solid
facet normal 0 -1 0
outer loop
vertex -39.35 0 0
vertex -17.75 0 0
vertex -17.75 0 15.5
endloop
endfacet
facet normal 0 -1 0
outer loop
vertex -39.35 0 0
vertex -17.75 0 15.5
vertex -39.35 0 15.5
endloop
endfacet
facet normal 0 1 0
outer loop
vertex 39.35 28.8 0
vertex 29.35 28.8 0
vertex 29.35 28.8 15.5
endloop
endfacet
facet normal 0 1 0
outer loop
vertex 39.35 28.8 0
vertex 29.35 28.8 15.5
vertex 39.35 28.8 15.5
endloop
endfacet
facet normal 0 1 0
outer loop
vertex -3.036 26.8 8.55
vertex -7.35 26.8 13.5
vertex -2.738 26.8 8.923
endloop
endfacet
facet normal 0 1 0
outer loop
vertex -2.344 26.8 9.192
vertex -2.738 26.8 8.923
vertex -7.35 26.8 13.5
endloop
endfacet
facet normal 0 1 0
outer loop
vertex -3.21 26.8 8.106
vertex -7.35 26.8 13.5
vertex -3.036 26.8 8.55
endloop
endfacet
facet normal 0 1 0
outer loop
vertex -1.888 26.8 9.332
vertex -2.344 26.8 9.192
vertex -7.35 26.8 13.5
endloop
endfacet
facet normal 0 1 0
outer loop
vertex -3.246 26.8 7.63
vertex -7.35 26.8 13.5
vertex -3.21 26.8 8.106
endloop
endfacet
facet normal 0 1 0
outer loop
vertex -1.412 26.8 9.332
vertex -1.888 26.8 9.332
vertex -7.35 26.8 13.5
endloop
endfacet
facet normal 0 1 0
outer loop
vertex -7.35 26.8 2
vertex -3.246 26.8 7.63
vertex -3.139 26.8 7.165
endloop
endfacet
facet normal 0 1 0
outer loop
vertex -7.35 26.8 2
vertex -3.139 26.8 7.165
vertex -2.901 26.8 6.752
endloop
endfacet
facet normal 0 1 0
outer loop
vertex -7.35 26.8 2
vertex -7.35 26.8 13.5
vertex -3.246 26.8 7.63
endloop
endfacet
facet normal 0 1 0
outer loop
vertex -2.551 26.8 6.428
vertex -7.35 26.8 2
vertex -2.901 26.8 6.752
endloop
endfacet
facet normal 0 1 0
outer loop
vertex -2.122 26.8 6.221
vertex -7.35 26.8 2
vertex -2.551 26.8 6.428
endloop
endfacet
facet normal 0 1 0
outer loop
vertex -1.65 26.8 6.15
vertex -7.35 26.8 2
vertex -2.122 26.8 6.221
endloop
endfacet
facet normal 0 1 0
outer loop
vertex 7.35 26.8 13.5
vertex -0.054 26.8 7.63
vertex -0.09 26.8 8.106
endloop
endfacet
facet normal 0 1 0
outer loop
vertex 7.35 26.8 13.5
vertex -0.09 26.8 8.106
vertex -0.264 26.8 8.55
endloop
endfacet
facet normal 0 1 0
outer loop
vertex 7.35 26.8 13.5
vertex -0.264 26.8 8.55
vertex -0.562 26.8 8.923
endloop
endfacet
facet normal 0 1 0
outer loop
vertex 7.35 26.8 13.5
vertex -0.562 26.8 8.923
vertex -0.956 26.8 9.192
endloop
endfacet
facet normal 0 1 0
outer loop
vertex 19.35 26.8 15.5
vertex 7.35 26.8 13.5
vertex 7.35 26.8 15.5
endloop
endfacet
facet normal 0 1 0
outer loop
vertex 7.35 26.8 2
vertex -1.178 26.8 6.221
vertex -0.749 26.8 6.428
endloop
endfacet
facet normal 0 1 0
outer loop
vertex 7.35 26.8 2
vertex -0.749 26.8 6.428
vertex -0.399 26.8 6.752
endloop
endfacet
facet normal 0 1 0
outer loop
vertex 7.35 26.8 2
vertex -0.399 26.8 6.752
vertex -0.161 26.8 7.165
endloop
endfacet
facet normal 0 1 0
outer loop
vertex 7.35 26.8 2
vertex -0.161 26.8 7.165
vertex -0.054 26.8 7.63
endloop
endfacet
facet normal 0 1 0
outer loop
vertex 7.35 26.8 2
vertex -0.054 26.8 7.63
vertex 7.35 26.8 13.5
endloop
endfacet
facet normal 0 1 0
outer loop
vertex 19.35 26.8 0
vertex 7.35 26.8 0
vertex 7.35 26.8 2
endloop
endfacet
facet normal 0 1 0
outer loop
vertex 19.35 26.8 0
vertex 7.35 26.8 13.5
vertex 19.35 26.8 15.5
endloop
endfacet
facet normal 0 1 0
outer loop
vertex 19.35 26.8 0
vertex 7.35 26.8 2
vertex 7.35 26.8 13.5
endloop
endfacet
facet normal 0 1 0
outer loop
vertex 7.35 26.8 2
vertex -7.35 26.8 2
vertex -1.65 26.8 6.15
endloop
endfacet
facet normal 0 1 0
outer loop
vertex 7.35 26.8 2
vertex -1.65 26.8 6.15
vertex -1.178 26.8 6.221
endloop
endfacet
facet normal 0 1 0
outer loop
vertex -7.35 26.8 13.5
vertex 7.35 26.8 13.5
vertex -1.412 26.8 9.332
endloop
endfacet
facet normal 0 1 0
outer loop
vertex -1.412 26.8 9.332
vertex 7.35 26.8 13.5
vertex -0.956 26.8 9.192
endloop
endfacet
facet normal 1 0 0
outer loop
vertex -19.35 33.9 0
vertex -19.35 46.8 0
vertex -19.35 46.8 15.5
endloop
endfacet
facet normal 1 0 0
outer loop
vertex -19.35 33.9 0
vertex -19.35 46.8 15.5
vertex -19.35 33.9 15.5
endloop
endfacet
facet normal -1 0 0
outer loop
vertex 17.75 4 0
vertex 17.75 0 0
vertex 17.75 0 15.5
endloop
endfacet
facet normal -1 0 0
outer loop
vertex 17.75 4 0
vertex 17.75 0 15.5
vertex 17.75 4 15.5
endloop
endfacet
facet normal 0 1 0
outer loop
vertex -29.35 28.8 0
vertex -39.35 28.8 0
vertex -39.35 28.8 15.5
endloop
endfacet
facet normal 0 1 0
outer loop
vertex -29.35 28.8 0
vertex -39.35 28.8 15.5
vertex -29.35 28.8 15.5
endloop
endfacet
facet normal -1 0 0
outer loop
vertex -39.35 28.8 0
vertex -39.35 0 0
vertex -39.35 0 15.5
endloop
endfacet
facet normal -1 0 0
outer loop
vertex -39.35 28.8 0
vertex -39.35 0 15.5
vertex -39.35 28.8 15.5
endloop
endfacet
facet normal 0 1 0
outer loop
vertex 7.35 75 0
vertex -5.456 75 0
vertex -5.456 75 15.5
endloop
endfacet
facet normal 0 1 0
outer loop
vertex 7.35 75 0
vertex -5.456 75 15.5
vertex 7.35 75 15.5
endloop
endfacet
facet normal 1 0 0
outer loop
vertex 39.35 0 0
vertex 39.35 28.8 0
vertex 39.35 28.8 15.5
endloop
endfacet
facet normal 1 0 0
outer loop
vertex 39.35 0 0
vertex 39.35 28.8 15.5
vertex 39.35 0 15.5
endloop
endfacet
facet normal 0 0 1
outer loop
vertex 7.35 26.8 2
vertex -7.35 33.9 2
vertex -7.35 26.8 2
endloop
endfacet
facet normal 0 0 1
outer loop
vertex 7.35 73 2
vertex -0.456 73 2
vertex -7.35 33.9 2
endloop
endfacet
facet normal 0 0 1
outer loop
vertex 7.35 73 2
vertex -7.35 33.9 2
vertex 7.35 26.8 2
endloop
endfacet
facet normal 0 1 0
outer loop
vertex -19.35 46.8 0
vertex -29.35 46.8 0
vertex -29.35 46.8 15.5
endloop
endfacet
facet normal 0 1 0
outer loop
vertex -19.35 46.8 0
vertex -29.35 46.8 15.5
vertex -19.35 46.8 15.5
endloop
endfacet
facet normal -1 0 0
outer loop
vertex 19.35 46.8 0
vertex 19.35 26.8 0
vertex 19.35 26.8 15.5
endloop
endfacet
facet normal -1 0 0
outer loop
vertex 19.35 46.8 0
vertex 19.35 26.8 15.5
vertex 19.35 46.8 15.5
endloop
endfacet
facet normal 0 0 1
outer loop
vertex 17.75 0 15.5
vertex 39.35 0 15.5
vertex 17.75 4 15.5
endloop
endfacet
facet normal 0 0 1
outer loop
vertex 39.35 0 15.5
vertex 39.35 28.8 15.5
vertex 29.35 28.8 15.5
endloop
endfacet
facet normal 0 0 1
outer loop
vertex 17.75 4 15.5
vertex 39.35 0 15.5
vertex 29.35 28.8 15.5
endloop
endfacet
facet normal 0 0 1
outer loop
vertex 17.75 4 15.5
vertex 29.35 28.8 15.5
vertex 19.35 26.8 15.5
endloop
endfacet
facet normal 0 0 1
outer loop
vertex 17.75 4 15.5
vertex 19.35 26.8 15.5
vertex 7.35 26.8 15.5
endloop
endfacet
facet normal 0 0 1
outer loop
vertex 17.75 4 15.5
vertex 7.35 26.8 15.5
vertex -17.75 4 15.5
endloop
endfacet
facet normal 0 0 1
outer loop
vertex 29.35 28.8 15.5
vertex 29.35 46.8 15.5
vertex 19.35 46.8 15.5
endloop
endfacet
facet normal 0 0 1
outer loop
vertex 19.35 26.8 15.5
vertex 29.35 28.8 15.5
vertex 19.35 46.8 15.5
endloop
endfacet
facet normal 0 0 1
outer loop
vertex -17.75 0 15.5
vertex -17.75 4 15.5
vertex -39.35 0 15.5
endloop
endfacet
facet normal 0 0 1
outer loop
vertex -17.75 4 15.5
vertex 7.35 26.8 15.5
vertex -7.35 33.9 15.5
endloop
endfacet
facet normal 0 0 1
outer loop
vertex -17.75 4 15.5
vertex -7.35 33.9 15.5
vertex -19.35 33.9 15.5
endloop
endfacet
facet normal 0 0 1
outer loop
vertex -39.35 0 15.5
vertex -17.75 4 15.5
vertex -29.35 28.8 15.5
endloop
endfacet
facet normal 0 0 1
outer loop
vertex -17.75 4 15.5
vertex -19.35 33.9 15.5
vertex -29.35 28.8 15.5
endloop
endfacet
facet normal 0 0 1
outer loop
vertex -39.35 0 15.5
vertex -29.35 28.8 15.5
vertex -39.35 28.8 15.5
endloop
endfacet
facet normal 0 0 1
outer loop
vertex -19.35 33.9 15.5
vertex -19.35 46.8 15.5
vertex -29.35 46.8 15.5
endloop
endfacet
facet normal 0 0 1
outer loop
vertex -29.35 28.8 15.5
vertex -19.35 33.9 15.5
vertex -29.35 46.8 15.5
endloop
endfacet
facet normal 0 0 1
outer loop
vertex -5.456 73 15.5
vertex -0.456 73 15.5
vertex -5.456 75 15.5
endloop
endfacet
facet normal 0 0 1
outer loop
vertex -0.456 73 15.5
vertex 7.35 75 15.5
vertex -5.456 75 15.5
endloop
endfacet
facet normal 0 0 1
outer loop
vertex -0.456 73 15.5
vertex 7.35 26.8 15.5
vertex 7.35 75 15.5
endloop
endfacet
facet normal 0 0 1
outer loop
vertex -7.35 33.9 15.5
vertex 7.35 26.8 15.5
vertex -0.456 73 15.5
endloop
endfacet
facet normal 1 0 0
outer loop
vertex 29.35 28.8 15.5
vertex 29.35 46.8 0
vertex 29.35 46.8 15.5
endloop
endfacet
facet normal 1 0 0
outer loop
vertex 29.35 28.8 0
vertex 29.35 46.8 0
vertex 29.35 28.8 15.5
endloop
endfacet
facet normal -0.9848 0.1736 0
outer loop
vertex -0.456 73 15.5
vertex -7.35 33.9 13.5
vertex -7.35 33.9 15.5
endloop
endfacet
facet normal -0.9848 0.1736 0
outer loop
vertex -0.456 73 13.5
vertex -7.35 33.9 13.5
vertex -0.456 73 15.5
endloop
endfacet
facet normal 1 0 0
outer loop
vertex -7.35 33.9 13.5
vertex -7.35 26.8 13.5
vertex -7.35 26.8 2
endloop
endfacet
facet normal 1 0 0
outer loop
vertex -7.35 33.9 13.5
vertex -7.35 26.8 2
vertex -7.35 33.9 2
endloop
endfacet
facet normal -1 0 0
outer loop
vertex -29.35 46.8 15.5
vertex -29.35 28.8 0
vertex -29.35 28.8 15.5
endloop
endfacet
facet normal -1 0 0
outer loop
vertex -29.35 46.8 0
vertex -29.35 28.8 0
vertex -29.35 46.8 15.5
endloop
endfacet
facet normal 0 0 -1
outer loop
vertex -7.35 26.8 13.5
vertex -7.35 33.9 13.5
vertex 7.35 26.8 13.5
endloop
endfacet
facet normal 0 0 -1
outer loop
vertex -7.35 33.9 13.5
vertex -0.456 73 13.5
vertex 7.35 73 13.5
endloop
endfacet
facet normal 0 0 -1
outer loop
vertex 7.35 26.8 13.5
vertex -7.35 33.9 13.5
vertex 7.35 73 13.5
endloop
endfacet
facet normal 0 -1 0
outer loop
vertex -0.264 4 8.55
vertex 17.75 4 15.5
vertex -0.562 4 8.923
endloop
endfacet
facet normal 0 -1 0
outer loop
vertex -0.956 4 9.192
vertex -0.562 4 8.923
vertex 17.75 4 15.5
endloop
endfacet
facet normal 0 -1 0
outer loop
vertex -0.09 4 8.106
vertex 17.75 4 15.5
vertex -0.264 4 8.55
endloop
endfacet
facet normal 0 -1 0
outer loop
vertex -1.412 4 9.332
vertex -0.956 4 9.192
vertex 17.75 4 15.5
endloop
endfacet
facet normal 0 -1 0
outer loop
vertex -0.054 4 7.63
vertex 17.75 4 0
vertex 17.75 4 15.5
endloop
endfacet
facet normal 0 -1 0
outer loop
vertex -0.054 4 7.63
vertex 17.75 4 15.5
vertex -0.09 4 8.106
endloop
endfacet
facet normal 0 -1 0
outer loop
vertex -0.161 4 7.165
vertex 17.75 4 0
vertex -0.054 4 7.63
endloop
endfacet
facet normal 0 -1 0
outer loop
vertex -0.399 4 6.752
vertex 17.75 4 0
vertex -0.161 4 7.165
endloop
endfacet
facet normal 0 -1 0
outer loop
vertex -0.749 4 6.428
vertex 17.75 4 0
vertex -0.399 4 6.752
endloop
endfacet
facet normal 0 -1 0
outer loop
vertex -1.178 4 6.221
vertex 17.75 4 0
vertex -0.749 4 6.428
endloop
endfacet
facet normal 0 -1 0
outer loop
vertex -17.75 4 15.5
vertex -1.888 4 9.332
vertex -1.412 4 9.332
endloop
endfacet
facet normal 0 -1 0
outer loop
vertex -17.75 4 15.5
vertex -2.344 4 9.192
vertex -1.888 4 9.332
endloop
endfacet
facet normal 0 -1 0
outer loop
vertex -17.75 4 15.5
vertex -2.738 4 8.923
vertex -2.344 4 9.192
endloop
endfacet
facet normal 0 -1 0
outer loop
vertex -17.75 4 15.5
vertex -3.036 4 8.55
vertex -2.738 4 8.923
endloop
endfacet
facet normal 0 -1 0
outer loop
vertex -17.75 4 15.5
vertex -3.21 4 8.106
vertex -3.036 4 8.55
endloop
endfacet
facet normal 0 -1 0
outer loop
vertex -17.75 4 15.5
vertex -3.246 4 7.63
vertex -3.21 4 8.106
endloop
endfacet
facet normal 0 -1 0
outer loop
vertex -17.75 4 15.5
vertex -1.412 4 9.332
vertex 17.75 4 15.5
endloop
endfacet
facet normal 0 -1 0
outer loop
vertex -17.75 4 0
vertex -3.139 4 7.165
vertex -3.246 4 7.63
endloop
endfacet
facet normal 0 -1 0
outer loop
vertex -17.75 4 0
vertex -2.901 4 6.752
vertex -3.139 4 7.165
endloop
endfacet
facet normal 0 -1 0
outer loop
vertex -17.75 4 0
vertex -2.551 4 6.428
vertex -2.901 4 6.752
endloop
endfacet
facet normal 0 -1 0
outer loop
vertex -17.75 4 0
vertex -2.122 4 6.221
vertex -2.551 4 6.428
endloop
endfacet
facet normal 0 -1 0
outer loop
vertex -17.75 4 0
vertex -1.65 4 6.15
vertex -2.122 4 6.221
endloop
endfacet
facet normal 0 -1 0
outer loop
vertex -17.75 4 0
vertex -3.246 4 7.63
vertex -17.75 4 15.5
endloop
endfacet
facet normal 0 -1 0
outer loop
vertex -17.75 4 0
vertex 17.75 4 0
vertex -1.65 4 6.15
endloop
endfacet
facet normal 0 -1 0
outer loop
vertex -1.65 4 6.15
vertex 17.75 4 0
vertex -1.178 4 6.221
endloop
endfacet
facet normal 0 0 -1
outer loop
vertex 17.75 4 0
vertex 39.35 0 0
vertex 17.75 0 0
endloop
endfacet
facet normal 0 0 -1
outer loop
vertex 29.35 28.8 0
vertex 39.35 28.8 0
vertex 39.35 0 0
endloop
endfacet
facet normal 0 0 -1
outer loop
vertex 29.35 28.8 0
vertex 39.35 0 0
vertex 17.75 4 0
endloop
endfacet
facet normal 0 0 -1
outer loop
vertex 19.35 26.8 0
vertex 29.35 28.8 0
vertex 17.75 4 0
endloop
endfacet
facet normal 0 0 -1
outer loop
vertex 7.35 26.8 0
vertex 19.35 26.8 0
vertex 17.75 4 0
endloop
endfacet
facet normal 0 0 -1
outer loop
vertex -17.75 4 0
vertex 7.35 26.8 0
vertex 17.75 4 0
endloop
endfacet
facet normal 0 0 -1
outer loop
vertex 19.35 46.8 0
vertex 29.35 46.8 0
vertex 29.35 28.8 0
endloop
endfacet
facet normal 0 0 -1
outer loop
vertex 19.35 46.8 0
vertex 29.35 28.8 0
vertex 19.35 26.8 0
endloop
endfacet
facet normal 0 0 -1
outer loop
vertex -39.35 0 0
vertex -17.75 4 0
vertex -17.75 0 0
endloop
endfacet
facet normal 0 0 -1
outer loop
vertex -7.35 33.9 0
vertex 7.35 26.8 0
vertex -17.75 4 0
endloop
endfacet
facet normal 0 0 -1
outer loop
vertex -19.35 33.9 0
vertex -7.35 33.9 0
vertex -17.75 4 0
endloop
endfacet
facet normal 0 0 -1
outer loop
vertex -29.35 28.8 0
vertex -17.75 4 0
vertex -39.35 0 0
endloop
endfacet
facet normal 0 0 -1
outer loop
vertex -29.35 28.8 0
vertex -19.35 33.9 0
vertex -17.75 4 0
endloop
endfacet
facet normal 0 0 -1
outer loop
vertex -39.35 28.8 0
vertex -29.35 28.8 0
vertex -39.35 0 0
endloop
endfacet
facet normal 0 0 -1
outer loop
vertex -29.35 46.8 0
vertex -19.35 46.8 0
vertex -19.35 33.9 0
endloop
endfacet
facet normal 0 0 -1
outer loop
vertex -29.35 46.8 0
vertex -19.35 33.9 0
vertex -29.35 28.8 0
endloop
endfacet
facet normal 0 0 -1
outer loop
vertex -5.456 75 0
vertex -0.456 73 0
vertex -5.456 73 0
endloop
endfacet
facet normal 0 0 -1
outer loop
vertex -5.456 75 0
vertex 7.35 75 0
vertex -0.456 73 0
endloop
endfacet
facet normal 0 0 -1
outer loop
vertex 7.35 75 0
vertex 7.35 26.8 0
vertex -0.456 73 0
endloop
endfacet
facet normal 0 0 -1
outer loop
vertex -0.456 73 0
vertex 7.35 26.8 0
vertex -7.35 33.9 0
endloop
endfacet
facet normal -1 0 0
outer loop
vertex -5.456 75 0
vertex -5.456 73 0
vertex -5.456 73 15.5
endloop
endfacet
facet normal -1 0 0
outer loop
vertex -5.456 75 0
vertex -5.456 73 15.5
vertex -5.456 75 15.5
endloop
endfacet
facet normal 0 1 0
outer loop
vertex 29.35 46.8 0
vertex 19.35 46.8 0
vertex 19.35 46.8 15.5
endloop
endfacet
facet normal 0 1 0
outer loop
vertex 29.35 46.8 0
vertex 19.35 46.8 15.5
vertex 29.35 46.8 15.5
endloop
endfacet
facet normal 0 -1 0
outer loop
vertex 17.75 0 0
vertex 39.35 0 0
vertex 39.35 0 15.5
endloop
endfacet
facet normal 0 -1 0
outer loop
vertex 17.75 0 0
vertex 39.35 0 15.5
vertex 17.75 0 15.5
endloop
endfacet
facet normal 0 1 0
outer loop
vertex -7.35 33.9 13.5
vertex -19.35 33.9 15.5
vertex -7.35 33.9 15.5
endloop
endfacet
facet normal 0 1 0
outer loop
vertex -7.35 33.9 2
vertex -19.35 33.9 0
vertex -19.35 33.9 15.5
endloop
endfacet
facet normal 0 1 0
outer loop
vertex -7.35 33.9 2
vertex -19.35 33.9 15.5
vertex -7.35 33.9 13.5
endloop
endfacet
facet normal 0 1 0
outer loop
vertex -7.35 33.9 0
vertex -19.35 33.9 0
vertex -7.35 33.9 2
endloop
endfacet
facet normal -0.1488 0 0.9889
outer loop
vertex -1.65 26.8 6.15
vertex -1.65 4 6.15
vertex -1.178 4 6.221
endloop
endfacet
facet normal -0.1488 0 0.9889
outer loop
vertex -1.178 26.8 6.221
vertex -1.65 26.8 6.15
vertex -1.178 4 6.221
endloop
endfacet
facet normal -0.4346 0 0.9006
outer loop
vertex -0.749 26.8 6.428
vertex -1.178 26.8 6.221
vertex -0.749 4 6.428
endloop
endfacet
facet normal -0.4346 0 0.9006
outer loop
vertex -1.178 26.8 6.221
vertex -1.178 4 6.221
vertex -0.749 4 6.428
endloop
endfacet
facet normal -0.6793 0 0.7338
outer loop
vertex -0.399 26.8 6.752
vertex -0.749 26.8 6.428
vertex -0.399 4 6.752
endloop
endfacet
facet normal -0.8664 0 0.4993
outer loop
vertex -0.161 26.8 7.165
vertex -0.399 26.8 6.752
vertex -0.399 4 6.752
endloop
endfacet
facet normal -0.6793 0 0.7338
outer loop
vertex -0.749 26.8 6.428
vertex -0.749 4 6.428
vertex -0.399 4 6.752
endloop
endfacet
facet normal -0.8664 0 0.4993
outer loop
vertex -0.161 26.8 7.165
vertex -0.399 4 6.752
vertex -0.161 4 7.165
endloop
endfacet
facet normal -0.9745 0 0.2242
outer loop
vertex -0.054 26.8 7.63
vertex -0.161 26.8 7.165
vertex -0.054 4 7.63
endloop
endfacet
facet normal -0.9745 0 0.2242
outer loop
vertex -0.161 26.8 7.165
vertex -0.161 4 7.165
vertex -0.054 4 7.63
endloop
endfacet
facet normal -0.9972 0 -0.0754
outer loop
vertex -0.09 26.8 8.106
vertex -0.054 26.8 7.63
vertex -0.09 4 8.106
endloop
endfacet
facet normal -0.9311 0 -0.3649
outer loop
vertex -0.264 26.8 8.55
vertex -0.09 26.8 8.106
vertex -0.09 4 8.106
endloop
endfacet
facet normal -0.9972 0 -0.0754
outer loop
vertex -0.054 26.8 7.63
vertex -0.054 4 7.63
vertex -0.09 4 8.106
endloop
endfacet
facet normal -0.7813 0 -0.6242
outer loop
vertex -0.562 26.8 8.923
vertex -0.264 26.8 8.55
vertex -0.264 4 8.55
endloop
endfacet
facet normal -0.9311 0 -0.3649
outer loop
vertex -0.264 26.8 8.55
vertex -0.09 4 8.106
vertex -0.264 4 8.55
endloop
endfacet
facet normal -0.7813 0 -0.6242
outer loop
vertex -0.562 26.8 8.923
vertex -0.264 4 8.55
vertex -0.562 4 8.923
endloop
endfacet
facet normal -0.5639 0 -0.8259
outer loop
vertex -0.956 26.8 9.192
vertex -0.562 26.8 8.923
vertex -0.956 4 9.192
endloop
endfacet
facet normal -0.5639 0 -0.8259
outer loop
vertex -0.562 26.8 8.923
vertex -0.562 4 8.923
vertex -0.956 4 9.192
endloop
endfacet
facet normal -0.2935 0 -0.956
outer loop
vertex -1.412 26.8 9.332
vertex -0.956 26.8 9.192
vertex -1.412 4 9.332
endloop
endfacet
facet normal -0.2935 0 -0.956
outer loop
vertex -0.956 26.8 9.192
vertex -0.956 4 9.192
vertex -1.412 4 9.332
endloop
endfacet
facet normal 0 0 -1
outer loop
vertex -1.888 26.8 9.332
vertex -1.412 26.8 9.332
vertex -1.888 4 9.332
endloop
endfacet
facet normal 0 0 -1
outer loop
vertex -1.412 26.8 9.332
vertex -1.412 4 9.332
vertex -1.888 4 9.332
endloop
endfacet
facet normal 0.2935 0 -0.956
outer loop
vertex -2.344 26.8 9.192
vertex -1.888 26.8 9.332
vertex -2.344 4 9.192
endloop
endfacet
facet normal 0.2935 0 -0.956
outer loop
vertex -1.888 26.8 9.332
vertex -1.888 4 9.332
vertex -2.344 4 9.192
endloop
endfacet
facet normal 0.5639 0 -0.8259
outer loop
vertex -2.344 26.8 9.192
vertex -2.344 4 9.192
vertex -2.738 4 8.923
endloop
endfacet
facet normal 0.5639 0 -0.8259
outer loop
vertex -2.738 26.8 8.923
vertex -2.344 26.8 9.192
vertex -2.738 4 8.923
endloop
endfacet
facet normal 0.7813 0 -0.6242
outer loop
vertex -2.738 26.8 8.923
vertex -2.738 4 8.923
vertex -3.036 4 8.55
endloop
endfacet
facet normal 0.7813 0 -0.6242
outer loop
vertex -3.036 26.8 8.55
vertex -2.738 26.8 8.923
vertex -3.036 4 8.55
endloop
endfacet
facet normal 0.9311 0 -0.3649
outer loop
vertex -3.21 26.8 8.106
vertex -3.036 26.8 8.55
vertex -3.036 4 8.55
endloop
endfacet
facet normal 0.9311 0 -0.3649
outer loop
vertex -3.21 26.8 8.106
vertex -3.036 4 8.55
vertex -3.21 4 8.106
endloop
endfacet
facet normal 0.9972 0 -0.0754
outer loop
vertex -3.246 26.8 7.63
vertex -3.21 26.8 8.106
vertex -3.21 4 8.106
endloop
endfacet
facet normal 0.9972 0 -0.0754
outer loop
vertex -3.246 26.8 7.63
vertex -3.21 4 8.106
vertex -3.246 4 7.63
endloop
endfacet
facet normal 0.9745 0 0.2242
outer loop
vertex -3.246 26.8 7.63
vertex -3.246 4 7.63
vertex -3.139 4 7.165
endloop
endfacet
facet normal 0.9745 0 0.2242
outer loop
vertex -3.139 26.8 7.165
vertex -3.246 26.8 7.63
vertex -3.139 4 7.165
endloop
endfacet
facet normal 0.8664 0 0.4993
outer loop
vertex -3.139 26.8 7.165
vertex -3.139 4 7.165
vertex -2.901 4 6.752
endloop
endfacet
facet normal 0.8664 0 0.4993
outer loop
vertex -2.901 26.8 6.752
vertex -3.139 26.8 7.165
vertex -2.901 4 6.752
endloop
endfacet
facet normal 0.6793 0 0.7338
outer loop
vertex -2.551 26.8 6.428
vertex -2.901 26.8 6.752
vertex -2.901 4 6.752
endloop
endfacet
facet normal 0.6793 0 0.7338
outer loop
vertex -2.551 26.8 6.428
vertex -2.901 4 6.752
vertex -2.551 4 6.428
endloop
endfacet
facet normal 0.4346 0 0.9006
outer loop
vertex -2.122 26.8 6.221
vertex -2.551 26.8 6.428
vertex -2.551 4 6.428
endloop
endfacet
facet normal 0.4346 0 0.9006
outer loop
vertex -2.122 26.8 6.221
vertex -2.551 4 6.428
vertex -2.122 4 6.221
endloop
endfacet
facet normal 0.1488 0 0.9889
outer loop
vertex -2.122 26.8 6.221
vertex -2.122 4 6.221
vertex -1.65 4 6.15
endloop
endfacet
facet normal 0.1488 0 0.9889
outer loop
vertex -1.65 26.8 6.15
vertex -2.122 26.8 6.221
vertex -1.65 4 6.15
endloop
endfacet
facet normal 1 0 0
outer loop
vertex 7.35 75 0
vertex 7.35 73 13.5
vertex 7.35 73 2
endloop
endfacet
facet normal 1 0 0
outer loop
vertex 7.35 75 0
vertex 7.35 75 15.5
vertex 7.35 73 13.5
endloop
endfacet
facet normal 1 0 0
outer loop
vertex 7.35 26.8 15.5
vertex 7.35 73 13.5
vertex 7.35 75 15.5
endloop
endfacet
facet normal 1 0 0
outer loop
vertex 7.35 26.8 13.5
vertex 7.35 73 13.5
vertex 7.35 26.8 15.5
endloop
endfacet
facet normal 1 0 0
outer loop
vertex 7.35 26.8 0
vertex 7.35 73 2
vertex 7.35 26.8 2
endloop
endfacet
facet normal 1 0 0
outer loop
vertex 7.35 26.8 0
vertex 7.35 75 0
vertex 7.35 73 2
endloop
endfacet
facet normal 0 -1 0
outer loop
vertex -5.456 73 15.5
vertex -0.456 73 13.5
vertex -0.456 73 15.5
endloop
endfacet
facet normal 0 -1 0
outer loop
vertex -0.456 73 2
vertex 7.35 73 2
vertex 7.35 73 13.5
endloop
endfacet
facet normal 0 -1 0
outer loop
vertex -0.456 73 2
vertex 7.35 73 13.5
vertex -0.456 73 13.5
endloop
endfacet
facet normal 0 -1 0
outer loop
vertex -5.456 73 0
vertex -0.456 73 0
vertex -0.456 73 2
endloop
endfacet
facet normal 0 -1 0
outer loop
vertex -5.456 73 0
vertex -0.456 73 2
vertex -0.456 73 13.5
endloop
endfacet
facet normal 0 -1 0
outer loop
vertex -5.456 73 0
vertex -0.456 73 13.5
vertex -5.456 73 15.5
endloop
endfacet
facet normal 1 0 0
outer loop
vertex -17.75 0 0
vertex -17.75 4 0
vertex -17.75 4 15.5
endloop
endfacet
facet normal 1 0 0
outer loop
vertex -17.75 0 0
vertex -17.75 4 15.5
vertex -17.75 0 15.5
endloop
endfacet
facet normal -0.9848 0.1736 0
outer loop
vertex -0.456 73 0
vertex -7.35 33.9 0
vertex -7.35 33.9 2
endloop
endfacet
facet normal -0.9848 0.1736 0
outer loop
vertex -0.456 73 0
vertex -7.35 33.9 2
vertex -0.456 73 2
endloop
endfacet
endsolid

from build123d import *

# Parameters (mm, degrees)
BOSS_EXTRU_1_DEPTH      = 15.5
ENL_V_START             = -2
ESQUISSE2_W             = 17.606783298
ESQUISSE2_H             = 46.2
ENL_V_MAT_EXTRU_1_DEPTH = 11.5
ENL_V_MAT_EXTRU_2_REACH = 88.103
ESQUISSE3_R             = 1.6


with BuildPart() as part:
    # Esquisse1 → Boss.-Extru.1 (new body)
    with BuildSketch(Plane.XY):
        Polygon((-39.35, 0), (-39.35, 28.8), (-29.35, 28.8), (-29.35, 46.8), (-19.35, 46.8), (-19.35, 33.9), (-7.35, 33.9), (-0.455615054, 73), (-5.455615054, 73), (-5.455615054, 75), (7.35, 75), (7.35, 26.8), (19.35, 26.8), (19.35, 46.8), (29.35, 46.8), (29.35, 28.8), (39.35, 28.8), (39.35, 0), (17.75, 0), (17.75, 4), (-17.75, 4), (-17.75, 0), align=None)
    extrude(amount=BOSS_EXTRU_1_DEPTH)

    # Esquisse2 → Enlèv. mat.-Extru.1 (cut)
    with BuildSketch(Plane.XY.offset(15.5).offset(ENL_V_START)):
        with Locations((1.453391649, 49.9)):
            Rectangle(ESQUISSE2_W, ESQUISSE2_H)
    extrude(amount=-ENL_V_MAT_EXTRU_1_DEPTH, mode=Mode.SUBTRACT)

    # Esquisse3 → Enlèv. mat.-Extru.2 (cut, up to next)
    with BuildSketch(Plane.XZ, mode=Mode.PRIVATE) as enl_v_mat_extru_2_sk1:
        with Locations(Location((-1.65, 7.75, 0), (0, 0, 270))):
            Circle(ESQUISSE3_R)
    enl_v_mat_extru_2_tool1 = extrude(enl_v_mat_extru_2_sk1.sketch, amount=-ENL_V_MAT_EXTRU_2_REACH, mode=Mode.PRIVATE) & part.part
    add(enl_v_mat_extru_2_tool1.solids().sort_by_distance((-1.65, 0, 7.75))[0], mode=Mode.SUBTRACT)


solid = part.part
